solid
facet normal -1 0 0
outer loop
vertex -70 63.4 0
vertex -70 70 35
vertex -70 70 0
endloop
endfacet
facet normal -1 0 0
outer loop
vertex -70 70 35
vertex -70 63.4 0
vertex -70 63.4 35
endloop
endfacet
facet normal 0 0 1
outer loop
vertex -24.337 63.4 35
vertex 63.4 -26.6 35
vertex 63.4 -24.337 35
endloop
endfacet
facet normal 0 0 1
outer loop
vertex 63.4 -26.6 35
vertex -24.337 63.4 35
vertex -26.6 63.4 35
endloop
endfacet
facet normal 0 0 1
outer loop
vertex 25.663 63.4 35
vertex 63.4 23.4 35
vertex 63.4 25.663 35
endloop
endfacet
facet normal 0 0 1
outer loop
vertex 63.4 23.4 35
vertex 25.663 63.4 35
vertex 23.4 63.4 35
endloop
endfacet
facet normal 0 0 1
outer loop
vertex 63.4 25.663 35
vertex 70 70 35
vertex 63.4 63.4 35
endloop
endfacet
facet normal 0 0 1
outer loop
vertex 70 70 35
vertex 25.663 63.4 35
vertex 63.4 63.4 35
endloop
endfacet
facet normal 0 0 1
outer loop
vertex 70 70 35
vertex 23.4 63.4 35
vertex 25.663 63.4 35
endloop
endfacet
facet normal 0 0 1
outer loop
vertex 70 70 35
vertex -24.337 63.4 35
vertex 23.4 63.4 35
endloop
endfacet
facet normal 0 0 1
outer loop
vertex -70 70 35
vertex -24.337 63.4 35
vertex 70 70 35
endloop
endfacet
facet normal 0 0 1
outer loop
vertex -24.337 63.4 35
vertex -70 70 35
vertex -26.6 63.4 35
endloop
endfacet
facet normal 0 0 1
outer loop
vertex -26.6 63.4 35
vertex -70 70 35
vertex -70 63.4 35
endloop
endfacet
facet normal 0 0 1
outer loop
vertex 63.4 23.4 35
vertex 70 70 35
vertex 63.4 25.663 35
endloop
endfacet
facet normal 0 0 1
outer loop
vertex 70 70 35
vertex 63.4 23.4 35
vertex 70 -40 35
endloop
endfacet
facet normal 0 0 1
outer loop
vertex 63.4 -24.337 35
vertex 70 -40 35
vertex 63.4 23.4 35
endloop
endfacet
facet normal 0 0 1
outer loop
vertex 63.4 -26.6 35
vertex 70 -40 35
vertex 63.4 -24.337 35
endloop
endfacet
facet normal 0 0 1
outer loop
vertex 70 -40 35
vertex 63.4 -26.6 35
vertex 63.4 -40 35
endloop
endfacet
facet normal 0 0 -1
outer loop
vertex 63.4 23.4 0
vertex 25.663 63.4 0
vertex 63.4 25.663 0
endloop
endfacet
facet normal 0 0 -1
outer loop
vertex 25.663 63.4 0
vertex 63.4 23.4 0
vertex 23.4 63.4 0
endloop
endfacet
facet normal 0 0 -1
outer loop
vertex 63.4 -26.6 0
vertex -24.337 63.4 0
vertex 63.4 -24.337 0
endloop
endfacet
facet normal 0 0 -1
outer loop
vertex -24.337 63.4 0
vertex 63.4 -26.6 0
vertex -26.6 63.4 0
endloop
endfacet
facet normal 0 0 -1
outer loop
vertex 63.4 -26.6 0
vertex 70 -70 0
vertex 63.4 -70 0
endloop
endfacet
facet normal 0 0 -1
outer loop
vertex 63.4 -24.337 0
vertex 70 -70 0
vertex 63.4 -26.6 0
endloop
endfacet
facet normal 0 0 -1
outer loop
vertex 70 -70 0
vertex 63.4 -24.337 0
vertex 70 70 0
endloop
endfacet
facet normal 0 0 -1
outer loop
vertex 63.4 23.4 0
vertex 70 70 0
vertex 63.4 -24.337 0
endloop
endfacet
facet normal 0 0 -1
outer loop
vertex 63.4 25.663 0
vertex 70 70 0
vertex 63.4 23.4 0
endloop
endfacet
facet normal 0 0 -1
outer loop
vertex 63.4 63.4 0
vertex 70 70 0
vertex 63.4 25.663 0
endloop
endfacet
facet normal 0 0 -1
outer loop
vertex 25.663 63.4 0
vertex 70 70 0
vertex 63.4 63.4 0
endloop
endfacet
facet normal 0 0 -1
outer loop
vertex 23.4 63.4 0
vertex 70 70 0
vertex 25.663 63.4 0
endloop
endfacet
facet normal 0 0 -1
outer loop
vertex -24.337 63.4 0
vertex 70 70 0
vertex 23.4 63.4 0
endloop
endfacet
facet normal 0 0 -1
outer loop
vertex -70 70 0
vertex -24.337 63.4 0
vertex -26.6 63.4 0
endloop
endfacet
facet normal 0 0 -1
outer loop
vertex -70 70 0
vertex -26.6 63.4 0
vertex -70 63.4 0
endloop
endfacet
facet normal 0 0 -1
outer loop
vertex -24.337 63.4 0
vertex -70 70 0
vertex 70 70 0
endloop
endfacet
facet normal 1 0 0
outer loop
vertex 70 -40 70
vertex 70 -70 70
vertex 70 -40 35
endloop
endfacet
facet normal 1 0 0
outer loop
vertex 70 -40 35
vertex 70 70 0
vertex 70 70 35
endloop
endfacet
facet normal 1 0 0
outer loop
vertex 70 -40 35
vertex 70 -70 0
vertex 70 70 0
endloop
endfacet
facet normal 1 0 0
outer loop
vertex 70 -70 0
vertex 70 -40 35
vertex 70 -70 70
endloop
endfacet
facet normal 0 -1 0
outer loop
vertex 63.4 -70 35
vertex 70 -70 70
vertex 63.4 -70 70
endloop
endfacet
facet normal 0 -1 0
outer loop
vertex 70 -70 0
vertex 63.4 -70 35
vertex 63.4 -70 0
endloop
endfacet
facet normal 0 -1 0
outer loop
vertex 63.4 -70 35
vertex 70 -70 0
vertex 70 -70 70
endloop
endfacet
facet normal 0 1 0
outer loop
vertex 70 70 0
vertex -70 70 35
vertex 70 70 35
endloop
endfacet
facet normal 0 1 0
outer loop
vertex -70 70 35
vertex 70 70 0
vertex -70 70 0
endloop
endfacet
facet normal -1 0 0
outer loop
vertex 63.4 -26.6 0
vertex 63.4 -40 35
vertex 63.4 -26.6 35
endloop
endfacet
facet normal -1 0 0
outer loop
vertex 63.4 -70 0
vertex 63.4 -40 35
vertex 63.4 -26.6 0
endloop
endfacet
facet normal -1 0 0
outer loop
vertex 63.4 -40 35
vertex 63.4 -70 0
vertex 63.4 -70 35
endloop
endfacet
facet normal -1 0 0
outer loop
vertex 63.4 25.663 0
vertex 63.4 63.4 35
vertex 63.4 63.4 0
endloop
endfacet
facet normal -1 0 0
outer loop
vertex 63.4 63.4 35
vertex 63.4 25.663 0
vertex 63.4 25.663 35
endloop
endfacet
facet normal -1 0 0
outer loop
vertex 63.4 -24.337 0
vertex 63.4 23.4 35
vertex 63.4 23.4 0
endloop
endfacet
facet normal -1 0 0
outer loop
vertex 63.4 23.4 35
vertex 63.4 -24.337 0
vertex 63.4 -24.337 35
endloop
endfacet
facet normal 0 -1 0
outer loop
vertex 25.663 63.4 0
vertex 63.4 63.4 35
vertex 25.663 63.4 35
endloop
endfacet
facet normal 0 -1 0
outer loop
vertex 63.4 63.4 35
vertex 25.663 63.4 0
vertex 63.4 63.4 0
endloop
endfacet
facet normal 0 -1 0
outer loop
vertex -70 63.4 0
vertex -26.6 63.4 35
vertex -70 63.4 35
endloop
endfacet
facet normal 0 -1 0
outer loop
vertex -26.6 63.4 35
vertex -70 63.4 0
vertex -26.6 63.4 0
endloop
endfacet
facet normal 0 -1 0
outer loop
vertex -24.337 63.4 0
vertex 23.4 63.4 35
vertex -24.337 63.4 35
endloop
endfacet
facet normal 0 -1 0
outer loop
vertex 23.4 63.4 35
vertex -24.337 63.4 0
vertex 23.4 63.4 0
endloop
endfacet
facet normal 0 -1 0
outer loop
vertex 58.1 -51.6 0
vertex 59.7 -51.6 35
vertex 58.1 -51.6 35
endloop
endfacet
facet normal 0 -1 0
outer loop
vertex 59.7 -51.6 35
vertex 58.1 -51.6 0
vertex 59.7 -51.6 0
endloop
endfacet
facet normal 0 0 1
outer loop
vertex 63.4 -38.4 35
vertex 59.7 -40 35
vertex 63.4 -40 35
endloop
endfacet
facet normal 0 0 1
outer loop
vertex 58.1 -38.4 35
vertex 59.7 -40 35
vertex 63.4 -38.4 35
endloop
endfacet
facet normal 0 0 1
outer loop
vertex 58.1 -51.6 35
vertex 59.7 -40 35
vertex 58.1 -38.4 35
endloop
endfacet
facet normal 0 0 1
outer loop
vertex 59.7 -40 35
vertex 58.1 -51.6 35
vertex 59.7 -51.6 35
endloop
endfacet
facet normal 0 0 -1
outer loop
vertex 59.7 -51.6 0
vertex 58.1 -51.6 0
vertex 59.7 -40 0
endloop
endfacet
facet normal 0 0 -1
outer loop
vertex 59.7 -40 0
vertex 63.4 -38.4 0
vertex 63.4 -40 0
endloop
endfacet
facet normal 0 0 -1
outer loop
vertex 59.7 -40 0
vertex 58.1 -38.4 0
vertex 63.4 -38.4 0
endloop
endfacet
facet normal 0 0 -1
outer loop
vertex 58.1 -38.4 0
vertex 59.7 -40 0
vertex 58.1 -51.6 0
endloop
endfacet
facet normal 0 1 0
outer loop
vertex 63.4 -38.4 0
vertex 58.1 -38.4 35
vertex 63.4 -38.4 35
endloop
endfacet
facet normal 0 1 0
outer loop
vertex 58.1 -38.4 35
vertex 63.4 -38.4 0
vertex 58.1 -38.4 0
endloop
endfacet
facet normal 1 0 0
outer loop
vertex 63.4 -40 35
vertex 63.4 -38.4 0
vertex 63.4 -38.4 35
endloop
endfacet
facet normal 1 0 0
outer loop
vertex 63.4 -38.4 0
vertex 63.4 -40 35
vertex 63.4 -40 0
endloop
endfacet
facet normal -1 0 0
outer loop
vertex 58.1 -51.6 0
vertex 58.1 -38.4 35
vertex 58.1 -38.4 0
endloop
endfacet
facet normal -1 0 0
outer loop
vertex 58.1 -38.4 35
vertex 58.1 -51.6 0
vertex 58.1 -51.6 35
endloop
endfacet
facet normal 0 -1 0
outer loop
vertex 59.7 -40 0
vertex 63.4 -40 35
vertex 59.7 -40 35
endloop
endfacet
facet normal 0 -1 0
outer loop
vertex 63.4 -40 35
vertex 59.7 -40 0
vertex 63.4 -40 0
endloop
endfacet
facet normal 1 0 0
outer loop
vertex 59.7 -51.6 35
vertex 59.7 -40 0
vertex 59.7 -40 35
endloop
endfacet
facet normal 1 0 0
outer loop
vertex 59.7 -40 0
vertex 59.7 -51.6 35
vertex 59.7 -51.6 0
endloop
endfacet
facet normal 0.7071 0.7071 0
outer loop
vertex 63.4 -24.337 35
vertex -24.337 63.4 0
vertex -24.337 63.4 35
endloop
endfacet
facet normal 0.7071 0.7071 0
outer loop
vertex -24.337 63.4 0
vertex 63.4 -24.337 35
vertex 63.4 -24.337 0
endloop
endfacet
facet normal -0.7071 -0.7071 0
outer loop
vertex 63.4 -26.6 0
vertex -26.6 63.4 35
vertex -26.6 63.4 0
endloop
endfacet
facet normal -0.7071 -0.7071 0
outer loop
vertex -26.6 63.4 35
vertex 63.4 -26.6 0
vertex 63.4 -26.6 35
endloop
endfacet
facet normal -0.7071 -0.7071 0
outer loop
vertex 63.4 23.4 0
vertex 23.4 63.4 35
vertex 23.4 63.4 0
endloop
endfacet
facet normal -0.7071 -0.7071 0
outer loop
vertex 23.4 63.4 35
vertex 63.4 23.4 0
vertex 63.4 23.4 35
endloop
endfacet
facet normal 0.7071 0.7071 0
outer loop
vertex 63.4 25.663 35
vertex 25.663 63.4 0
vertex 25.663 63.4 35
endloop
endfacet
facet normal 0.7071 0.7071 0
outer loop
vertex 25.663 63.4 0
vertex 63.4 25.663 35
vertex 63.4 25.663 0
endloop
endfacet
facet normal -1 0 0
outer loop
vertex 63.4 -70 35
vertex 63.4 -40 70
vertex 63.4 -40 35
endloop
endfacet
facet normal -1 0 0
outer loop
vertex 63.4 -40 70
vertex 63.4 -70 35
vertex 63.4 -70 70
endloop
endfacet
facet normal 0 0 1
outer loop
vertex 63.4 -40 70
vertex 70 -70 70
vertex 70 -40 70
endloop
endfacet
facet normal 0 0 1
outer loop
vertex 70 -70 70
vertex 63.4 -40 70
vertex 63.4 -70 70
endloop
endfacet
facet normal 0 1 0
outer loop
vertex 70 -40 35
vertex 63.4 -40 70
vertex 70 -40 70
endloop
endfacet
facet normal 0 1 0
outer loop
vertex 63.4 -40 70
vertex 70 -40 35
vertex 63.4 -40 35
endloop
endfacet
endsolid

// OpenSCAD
// Sized to fit on a 150x150 bed, leaving enough room for a brim.
length=140;

// This is meant to be about the exact width of the Logitech C310's
// clip/bracket thing. Other cameras in the series hopefully have the same size
// or some similar setup.
width=35;

// The thickness that walls will be printed at on your printer. This is to
// prevent infill, so things print fast. (We're going to use 2 x shell
// thickness.)
shellThickness = 0.8;
wallWidth = 2 * shellThickness;

// millimeters of infill between walls
infill = 5;

thickness = (2*shellThickness+infill);

// Don't do the crossbar all the way so that we don't interfere with where the
// camera has to be strapped on to.
cameraClearance = 40;

// A part sticking out next to the main bracket to easily clamp it down with a
// bulldog clip. Only on one side so that this can still be printed flat.
// I had this 40mm, but then it collides with the linear bearings.
toungeLength = 30;
// Just double up the main width? You might want to set this to your bulldog
// clip's width exactly.
toungeWidth = width;

// The lip goes over the build platform so you can slide the bracket on.
// This is just about the only critical size in here. Measure the bed!
// TIP: print a tiny little bracket with the gap first and test fit that before
// you waste hours and lots of plastic.
lipGap = 3.7;
// If you make this too big, then you're going to cut into your print area.
lipOverlap = 10+wallWidth;

// Two crossbars for strength.
crossbarOffset = length - max(cameraClearance, toungeLength);
halfCrossbarOffset = crossbarOffset / 2;

module crossbar(offset) {
  translate([offset+wallWidth, wallWidth, 0])
  rotate([0, 0, 45+90])
  cube([sqrt(2)*offset, wallWidth, width]);
}

module rightAngle(w1, h1, w2, h2, depth) {
  difference() {
    cube([w1, h1, depth]);
    translate([w1-w2, h1-h2, 0])
    cube([w2, h2, depth]);
  }
}

rotate([0, 0, 180])
translate([-length/2, -length/2, 0]) {
  union() {
    // main
    rightAngle(
      length, length,
      length-thickness, length-thickness,
      width);

    // crossbars
    crossbar(crossbarOffset);
    crossbar(halfCrossbarOffset);

    // tounge
    translate([0, length-toungeLength, toungeWidth])
    cube([thickness, toungeLength, toungeWidth]);

    // lip
    translate([lipGap+thickness+wallWidth, length-(toungeLength+wallWidth), 0])
    rotate([0, 0, 90])
    rightAngle(
      lipOverlap+wallWidth, lipGap+wallWidth,
      lipOverlap, lipGap,
      width);
  }
}
